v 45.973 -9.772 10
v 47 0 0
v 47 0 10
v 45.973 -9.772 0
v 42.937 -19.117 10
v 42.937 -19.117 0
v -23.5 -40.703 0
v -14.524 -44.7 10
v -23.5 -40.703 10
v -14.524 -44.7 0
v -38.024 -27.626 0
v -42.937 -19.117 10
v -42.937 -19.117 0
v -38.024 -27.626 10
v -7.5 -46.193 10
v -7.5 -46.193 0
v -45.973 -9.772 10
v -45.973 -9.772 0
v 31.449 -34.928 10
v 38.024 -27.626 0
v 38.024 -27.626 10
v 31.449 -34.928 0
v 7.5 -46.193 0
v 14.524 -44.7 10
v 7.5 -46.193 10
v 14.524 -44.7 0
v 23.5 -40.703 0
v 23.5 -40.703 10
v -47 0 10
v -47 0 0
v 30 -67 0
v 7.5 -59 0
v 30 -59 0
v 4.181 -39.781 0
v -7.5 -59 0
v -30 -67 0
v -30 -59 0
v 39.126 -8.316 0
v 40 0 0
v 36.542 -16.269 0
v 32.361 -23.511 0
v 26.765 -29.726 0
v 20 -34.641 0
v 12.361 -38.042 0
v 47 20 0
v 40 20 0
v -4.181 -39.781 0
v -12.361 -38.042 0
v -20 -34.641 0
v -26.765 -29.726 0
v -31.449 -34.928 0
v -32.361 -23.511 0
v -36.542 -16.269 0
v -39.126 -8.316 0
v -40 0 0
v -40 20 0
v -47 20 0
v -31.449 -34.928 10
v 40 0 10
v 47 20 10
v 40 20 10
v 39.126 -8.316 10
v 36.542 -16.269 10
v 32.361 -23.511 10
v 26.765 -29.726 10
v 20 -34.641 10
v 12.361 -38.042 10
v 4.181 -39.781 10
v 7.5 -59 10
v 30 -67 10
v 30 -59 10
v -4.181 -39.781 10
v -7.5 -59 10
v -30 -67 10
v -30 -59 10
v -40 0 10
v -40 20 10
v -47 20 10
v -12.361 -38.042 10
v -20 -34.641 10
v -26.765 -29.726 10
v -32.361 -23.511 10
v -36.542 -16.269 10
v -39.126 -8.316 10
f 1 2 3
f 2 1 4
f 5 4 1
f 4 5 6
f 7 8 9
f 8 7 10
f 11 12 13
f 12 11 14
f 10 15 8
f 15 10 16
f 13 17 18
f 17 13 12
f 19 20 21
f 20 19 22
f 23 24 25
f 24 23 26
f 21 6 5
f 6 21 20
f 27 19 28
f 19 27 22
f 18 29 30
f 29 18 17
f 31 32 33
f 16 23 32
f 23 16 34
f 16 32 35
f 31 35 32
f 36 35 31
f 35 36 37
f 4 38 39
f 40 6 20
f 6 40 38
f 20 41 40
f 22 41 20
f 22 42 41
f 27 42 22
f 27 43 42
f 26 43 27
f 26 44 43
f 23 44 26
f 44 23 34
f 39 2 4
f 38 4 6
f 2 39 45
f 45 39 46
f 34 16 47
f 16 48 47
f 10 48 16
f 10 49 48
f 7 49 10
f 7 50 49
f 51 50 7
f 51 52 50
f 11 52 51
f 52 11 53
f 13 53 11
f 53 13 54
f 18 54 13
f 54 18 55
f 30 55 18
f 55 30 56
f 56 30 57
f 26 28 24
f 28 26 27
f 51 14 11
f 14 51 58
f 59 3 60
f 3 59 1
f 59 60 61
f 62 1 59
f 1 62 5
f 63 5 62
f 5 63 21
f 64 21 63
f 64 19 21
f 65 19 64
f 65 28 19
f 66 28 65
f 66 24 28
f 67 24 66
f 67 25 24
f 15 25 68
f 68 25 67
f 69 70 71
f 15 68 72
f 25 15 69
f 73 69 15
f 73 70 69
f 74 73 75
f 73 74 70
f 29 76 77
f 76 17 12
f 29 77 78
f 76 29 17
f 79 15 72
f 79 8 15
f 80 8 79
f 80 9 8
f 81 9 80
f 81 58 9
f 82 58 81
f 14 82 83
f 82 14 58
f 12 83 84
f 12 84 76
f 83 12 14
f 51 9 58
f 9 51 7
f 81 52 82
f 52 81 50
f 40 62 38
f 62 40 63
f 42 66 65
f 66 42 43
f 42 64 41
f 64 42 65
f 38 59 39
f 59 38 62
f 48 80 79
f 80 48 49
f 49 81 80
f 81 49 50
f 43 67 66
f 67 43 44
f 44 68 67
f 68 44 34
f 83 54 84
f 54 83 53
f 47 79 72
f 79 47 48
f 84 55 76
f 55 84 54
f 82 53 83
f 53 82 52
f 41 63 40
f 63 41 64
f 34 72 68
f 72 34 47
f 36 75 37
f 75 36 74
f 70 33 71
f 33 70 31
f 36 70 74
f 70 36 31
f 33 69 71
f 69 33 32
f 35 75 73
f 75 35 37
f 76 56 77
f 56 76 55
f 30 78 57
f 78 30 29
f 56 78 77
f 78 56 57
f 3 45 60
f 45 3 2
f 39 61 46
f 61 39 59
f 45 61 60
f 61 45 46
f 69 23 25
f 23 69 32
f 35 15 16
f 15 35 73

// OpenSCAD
diam_cercle = 80;
epaisseur_cercle = 14;
hauteur_cercle = 10;
diam_cercle_ext = diam_cercle + epaisseur_cercle;
extrusion = 20;
depassement_arriere = 15;
tronc_arriere = 15;
longueur_attache = 60;
profondeur_attache = 8;
diam_trou = 2;
pos_trou_X = 20;
pos_trou_Y = 20;
demi_hauteur = hauteur_cercle / 2;



union(){
	difference(){
		difference() {
			cylinder(d = diam_cercle_ext, h = hauteur_cercle);
			cylinder(d = diam_cercle, h = hauteur_cercle);
		}	
			translate([-diam_cercle_ext/2,0,0]){
			cube([diam_cercle_ext,diam_cercle_ext,hauteur_cercle+1]);
		}
	}
	translate([-diam_cercle_ext/2,0,0]){
		cube([epaisseur_cercle/2,extrusion, hauteur_cercle]);
		}
	translate([diam_cercle/2,0,0]){
		cube([epaisseur_cercle/2,extrusion, hauteur_cercle]);
		}
	translate([tronc_arriere/2,-diam_cercle_ext/2 + 3,0]){
		rotate([0,0,180]){
			cube([tronc_arriere,depassement_arriere,hauteur_cercle]);
		}
	}
	translate([longueur_attache/2,-diam_cercle_ext/2 - depassement_arriere + 3,0]){
		rotate([0,0,180]){
			difference(){
				cube([longueur_attache,profondeur_attache,hauteur_cercle]);
				rotate([-90,0,0]) {
					union() {
/*						translate([longueur_attache/ 2 - pos_trou_X,demi_hauteur - pos_trou_Y,0]){
							cylinder(d= diam_trou, h = profondeur_attache + 1);
						}
						translate([longueur_attache/ 2 + pos_trou_X,demi_hauteur ,0]){
							cylinder(d= diam_trou, h = profondeur_attache + 1);
						}
						translate([longueur_attache/ 2 - pos_trou_X,hauteur_cercle/ 2 ,0]){
							cylinder(d= diam_trou, h = profondeur_attache + 1);
						}
						translate([longueur_attache/ 2 + pos_trou_X,hauteur_cercle/ 2 ,0]){
							cylinder(d= diam_trou, h = profondeur_attache + 1);
						}
*/
					}
				}
			}
		}
	}

}
